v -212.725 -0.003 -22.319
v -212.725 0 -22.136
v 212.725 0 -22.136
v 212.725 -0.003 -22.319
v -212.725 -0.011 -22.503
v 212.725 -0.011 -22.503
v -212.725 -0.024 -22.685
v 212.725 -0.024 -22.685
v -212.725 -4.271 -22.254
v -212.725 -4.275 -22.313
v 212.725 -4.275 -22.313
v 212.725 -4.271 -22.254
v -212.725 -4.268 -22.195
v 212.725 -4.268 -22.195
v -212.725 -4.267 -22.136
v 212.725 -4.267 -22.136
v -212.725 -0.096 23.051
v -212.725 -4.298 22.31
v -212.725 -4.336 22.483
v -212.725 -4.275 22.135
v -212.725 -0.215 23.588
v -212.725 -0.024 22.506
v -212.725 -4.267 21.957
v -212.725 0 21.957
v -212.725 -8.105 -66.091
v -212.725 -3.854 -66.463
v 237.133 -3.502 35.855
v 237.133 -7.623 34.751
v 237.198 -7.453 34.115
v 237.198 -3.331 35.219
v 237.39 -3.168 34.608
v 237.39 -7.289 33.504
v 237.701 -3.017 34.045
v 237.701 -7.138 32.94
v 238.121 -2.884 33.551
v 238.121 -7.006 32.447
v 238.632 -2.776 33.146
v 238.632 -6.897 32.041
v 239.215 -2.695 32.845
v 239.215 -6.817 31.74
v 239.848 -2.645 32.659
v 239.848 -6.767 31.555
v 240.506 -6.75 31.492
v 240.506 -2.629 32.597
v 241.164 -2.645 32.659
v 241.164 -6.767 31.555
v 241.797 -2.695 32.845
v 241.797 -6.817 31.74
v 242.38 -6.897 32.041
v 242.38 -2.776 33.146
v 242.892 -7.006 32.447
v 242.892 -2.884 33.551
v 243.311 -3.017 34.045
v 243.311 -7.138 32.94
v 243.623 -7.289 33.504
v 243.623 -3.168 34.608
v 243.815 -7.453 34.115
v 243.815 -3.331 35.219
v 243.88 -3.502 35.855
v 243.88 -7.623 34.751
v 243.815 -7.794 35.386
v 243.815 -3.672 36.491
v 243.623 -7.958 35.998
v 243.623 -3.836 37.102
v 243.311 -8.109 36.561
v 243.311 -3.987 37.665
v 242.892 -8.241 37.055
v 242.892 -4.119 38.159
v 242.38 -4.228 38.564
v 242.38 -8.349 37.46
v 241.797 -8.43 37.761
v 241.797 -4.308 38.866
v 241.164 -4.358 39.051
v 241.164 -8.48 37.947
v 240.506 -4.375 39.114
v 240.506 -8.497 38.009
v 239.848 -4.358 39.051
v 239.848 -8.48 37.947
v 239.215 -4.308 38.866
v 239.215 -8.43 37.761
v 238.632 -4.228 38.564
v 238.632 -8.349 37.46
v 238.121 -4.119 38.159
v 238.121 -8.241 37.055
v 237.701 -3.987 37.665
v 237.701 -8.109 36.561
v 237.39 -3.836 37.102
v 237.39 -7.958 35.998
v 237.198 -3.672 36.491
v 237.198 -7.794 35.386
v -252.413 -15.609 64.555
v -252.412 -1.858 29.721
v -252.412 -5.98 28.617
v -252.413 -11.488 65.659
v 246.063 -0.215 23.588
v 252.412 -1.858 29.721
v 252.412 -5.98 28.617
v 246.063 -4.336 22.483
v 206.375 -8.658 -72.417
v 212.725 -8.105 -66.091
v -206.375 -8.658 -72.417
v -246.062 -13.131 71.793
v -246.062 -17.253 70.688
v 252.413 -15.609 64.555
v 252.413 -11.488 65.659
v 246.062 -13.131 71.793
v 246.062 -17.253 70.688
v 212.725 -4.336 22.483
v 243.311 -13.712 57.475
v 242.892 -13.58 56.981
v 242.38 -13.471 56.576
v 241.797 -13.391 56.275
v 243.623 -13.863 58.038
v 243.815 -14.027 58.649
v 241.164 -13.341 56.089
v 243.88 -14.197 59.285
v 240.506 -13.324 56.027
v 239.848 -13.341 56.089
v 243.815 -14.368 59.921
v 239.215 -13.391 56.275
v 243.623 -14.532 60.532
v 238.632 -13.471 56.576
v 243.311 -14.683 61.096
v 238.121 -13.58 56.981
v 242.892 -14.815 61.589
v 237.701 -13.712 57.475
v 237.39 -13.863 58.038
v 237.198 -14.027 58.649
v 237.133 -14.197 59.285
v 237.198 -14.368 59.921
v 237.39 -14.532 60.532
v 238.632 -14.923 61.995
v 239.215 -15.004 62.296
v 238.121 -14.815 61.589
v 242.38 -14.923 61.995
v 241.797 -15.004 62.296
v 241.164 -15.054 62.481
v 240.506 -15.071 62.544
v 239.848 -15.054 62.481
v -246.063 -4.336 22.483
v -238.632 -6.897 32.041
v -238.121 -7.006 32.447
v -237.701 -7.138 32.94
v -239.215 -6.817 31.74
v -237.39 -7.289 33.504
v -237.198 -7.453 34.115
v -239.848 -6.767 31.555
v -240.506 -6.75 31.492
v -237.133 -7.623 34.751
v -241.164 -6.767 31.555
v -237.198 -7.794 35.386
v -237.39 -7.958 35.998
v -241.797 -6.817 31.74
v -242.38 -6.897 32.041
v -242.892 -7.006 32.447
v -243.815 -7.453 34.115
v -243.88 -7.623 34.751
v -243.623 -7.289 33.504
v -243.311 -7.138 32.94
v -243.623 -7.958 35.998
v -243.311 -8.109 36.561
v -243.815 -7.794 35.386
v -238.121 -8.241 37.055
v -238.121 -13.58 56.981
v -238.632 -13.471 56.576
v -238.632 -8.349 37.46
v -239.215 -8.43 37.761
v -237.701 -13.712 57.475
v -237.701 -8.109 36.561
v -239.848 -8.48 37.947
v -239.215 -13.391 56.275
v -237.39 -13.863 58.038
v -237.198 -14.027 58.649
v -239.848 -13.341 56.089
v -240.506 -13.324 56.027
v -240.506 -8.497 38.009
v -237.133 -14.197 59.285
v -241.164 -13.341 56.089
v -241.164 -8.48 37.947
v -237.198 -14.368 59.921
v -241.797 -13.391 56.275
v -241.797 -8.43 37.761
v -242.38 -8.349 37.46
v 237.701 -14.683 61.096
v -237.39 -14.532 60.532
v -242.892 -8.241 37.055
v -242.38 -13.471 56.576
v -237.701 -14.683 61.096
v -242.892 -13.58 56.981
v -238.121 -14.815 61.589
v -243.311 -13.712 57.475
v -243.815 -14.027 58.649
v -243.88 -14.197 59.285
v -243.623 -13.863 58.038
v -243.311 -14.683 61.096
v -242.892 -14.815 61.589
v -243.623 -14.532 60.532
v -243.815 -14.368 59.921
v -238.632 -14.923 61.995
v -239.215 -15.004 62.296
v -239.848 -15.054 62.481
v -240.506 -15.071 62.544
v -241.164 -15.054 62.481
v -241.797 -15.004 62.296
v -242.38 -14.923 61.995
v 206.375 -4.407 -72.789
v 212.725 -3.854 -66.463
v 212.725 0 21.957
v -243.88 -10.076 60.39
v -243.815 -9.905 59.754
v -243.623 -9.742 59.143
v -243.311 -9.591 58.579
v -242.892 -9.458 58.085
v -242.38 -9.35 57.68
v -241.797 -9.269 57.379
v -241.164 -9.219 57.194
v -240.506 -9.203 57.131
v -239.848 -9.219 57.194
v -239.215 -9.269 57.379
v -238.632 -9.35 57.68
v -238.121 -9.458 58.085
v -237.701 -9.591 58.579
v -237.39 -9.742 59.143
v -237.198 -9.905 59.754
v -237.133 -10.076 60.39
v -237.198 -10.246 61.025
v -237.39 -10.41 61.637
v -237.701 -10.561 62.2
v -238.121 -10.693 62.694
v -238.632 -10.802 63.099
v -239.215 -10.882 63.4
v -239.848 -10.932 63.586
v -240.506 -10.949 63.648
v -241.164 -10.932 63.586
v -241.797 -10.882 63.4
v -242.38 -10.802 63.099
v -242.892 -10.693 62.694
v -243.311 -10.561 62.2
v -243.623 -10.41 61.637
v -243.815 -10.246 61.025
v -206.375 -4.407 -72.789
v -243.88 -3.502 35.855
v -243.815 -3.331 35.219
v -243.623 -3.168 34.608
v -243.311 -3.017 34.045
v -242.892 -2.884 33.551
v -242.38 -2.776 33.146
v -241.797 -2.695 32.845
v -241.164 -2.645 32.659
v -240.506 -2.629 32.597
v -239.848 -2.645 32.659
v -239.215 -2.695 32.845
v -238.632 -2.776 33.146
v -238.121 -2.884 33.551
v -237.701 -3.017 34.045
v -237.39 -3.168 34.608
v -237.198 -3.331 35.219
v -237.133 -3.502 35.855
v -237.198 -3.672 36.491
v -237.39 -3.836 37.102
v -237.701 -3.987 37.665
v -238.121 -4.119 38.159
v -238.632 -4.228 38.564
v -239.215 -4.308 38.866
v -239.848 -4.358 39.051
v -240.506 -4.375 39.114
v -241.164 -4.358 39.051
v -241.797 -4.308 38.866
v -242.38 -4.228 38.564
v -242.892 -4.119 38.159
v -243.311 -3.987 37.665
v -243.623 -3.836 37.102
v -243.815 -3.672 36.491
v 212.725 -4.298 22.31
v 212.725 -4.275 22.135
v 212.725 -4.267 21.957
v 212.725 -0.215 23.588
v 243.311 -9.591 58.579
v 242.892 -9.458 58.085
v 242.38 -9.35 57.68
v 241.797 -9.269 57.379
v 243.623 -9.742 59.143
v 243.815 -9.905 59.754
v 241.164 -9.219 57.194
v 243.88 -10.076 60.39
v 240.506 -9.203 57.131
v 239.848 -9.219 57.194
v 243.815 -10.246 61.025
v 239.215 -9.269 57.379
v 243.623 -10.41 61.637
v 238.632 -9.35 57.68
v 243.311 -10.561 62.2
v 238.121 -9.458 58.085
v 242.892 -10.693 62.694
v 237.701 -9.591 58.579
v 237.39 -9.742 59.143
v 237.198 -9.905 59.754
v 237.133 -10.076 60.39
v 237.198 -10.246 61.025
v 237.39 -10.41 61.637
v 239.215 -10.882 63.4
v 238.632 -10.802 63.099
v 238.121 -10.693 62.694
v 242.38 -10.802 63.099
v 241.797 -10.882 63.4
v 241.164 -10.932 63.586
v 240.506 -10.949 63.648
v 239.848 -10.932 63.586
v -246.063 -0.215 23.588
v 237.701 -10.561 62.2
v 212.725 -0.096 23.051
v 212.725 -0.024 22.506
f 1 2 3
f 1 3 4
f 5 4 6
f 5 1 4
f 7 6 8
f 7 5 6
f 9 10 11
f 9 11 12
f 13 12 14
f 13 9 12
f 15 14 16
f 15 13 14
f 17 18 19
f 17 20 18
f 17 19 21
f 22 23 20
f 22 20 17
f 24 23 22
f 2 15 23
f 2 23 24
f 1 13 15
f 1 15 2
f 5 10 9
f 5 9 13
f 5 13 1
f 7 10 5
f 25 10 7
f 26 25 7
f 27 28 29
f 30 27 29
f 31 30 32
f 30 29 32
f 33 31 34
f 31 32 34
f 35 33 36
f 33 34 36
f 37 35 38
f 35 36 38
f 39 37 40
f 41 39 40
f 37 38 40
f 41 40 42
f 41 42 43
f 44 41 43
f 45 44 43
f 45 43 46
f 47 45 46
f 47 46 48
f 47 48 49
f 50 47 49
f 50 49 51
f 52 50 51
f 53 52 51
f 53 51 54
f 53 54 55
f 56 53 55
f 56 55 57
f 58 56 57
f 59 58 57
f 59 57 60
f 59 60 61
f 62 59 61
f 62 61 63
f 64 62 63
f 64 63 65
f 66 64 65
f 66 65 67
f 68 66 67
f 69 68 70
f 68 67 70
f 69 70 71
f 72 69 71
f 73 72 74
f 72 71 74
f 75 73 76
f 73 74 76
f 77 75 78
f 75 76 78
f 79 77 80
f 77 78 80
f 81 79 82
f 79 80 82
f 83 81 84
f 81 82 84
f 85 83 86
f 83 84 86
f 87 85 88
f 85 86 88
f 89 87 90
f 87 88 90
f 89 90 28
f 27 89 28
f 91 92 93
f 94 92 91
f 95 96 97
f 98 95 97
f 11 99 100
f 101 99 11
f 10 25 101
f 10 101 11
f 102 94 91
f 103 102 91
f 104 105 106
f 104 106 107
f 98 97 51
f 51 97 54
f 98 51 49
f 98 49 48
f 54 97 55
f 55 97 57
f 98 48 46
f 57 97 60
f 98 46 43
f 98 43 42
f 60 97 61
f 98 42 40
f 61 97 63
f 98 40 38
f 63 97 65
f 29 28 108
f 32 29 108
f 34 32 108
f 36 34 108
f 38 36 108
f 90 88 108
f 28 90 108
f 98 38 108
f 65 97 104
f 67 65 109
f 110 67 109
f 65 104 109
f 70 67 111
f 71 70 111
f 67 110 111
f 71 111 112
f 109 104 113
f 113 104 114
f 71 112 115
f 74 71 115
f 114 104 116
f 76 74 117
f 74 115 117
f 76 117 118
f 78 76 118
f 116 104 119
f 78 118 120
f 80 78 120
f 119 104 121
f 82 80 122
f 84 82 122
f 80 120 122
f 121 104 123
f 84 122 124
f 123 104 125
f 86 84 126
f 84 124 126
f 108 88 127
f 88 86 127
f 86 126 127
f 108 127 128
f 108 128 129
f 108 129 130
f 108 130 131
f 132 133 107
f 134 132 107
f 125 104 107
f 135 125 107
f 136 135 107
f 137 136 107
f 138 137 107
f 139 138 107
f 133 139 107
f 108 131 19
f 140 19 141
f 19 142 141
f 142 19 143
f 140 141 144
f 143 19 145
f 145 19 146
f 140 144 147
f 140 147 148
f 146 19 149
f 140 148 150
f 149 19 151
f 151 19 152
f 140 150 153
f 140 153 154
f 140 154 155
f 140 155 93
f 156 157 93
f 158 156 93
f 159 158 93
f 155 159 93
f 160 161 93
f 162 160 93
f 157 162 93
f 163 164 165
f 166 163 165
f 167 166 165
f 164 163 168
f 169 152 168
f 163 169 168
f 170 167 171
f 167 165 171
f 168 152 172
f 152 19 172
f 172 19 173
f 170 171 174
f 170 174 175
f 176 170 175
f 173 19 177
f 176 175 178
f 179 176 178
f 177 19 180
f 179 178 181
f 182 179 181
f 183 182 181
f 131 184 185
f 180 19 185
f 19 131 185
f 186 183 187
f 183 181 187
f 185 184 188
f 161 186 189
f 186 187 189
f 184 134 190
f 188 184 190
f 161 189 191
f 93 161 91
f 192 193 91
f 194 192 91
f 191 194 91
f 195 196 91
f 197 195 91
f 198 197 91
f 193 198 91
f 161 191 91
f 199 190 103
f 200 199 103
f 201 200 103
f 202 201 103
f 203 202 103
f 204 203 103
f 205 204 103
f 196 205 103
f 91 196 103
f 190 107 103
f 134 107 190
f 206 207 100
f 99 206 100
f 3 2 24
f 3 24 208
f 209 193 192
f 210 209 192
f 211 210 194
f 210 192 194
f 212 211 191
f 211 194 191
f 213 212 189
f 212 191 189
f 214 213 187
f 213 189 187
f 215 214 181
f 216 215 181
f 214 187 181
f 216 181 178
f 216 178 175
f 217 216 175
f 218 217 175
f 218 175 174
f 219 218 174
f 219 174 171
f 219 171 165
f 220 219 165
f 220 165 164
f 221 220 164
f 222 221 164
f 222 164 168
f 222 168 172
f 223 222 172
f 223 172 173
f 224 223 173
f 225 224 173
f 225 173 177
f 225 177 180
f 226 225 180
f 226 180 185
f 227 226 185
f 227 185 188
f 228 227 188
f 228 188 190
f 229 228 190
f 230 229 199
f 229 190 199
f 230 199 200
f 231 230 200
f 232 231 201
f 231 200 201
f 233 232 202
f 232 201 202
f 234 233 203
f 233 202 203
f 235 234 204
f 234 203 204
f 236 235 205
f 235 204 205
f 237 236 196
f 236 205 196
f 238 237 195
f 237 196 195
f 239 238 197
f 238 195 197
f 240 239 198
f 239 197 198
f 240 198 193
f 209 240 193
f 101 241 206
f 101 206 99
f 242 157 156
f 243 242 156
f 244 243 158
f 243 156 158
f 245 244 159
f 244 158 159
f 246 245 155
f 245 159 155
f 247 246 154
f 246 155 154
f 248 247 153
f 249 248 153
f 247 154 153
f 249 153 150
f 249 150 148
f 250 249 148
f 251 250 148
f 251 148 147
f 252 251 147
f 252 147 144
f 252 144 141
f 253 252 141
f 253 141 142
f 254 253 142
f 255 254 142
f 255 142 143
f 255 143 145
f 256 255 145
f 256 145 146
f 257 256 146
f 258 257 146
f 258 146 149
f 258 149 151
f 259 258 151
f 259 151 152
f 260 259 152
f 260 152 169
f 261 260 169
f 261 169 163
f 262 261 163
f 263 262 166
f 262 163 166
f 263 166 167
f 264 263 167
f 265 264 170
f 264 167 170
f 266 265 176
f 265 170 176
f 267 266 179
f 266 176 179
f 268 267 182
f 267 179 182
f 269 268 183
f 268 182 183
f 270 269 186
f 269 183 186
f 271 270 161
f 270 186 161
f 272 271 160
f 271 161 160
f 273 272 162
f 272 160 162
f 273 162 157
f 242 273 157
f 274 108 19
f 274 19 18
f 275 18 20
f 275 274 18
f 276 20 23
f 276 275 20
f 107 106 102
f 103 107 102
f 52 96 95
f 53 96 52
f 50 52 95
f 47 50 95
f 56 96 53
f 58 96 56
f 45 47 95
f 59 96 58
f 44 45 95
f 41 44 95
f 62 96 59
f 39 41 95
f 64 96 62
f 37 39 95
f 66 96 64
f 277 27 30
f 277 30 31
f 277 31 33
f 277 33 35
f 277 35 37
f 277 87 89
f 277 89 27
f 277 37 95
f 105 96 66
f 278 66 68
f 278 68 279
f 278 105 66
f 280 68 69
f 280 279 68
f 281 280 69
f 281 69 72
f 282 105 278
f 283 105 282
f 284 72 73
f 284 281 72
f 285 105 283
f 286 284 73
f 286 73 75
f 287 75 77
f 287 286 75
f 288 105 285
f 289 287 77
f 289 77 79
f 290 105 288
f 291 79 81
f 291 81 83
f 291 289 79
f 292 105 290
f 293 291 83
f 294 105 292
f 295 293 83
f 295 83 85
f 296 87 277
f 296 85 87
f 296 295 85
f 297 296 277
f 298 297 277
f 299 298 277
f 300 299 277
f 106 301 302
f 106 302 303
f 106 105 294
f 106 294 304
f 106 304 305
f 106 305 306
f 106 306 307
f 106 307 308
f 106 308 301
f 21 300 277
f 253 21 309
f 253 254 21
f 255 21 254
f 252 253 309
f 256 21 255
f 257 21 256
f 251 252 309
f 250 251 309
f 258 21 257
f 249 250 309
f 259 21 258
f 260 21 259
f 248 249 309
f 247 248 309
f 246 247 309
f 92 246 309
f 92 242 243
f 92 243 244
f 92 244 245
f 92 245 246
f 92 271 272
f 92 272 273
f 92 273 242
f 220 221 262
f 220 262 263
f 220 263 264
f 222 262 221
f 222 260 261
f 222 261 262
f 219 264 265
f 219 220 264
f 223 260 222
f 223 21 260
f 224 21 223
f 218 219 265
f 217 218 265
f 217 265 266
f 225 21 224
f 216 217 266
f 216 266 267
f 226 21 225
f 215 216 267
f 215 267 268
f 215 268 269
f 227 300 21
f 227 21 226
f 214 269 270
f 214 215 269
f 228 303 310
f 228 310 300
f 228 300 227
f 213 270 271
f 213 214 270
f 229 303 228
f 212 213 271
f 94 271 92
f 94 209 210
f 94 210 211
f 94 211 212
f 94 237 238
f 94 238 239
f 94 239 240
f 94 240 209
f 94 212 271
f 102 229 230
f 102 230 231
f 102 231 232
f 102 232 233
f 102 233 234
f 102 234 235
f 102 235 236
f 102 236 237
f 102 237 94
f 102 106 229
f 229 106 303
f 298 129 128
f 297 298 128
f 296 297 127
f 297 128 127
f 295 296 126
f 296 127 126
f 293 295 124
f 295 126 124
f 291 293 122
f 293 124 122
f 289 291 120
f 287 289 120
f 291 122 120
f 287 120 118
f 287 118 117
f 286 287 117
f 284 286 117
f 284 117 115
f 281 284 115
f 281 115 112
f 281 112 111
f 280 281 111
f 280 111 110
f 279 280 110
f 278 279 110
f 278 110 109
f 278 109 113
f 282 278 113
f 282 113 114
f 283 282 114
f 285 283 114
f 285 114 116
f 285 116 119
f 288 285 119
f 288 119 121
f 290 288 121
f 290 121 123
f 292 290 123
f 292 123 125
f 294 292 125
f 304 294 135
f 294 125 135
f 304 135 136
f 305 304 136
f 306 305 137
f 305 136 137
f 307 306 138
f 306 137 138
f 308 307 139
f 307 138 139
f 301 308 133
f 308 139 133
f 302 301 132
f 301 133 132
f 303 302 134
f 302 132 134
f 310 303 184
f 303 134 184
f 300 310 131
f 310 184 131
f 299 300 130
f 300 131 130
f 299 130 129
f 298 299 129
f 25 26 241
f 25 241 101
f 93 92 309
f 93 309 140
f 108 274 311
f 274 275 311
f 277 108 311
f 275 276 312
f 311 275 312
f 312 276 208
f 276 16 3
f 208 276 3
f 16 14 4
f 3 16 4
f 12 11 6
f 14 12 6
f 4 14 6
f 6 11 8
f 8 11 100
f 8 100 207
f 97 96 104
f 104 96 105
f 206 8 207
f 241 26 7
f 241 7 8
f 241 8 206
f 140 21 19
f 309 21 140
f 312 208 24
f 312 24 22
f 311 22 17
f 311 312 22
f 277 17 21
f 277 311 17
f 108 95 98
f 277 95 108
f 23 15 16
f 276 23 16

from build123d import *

# Parameters (mm, degrees)
SKETCH1_W                        = 425.45
SKETCH1_H                        = 44.45
BASE_FLANGE1_DEPTH               = 4.2672
EDGE_FLANGE1_STRIP_CUT_DEPTH     = 425.45
EDGE_FLANGE1_DEPTH               = 425.45
EDGE_FLANGE1_START               = 4.2672
EDGE_FLANGE1_PROFILE_W           = 504.825
EDGE_FLANGE1_PROFILE_H           = 49.905487105
EDGE_FLANGE1_FLAT_DEPTH          = 4.2672
EDGE_FLANGE2_STRIP_CUT_DEPTH     = 425.45
EDGE_FLANGE2_DEPTH               = 425.45
CHAMFER1_SIZE                    = 6.35
F_17_64_0_26563_DIAMETER_HOLE1_D = 6.747002


# Sheet-metal steps are written as plain solids
with BuildPart() as part:
    # Sketch1 → Base-Flange1 (new body)
    with BuildSketch(Plane(origin=(0, 0, 0), x_dir=(1, 0, 0), z_dir=(0, 1, 0))):
        Rectangle(SKETCH1_W, SKETCH1_H)
    extrude(amount=-BASE_FLANGE1_DEPTH)

    # Edge-Flange1 strip (across the edge) → Edge-Flange1 strip cut (cut)
    with BuildSketch(Plane(origin=(212.725, -4.2672, 22.225), x_dir=(0, -0.96592582628907, -0.2588190451025146), z_dir=(-1, 0, 0))):
        Polygon((-9.522131081, 19.049882248), (-4.052559965, -1.362835054), (0.069238721, -0.258402425), (-5.400332395, 20.154314877), align=None)
    extrude(amount=EDGE_FLANGE1_STRIP_CUT_DEPTH, mode=Mode.SUBTRACT)

    # Edge-Flange1 bend section (across the edge) → Edge-Flange1 (add)
    with BuildSketch(Plane(origin=(212.725, -4.2672, 22.225), x_dir=(0, -0.96592582628907, -0.2588190451025146), z_dir=(-1, 0, 0))):
        with BuildLine():
            Line((-4.2672, 0.267517875), (0, 0.267517875))
            ThreePointArc((0, 0.267517875), (0.017384042, 0.002288653), (0.069238721, -0.258402425))
            Line((0.069238721, -0.258402425), (-4.052559965, -1.362835054))
            ThreePointArc((-4.052559965, -1.362835054), (-4.213309471, -0.554692715), (-4.2672, 0.267517875))
        make_face()
    extrude(amount=EDGE_FLANGE1_DEPTH)

    # Edge-Flange1 profile (on flange) → Edge-Flange1 flat (add)
    with BuildSketch(Plane(origin=(0, -4.2672, 22.225), x_dir=(-1, 0, 0), z_dir=(0, 0.96592582628907, 0.2588190451025146)).offset(EDGE_FLANGE1_START)):
        with Locations((0, 25.220261428)):
            Rectangle(EDGE_FLANGE1_PROFILE_W, EDGE_FLANGE1_PROFILE_H)
    extrude(amount=-EDGE_FLANGE1_FLAT_DEPTH)

    # Edge-Flange2 strip (across the edge) → Edge-Flange2 strip cut (cut)
    with BuildSketch(Plane(origin=(-212.725, -4.2672, -22.225), x_dir=(0, -0.9961946980917461, 0.08715574274765156), z_dir=(1, 0, 0))):
        Polygon((-6.085074523, 20.592090897), (-4.243229642, -0.460292419), (0.007732373, -0.088381433), (-1.834112507, 20.964001883), align=None)
    extrude(amount=EDGE_FLANGE2_STRIP_CUT_DEPTH, mode=Mode.SUBTRACT)

    # Edge-Flange2 section (across the edge) → Edge-Flange2 (add)
    with BuildSketch(Plane(origin=(-212.725, -4.2672, -22.225), x_dir=(0, -0.9961946980917461, 0.08715574274765156), z_dir=(1, 0, 0))):
        with BuildLine():
            Line((-4.2672, 0.088719036), (-4.2672, 50.38333524))
            Line((-4.2672, 50.38333524), (0, 50.38333524))
            Line((0, 50.38333524), (0, 0.088719036))
            ThreePointArc((0, 0.088719036), (0.001934014, 8.4441e-05), (0.007732373, -0.088381433))
            Line((0.007732373, -0.088381433), (-4.243229642, -0.460292419))
            ThreePointArc((-4.243229642, -0.460292419), (-4.261204557, -0.186048209), (-4.2672, 0.088719036))
        make_face()
    extrude(amount=EDGE_FLANGE2_DEPTH)

    # Chamfer1
    chamfer1_edges = [part.edges().sort_by_distance(p)[0] for p in [
        (-252.4125, -2.275539378, 23.035618739),
        (252.4125, -2.275539378, 23.035618739),
        (252.4125, -15.192029896, 71.240617608),
        (-252.4125, -15.192029896, 71.240617608),
        (-212.725, -6.532915997, -72.602566931),
        (212.725, -6.532915997, -72.602566931),
    ]]
    chamfer(chamfer1_edges, length=CHAMFER1_SIZE)

    # 17/64 (0.26563) Diameter Hole1 (through all)
    with Locations(Plane(origin=(0, 5.696696884, 1.52642533), x_dir=(1, 0, 0), z_dir=(0, 0.96592582628907, 0.2588190451025147))):
        with Locations((-240.50625, -35.539651994), (-240.50625, -60.939651994), (240.50625, -60.939651994), (240.50625, -35.539651994)):
            Hole(F_17_64_0_26563_DIAMETER_HOLE1_D / 2)


solid = part.part
